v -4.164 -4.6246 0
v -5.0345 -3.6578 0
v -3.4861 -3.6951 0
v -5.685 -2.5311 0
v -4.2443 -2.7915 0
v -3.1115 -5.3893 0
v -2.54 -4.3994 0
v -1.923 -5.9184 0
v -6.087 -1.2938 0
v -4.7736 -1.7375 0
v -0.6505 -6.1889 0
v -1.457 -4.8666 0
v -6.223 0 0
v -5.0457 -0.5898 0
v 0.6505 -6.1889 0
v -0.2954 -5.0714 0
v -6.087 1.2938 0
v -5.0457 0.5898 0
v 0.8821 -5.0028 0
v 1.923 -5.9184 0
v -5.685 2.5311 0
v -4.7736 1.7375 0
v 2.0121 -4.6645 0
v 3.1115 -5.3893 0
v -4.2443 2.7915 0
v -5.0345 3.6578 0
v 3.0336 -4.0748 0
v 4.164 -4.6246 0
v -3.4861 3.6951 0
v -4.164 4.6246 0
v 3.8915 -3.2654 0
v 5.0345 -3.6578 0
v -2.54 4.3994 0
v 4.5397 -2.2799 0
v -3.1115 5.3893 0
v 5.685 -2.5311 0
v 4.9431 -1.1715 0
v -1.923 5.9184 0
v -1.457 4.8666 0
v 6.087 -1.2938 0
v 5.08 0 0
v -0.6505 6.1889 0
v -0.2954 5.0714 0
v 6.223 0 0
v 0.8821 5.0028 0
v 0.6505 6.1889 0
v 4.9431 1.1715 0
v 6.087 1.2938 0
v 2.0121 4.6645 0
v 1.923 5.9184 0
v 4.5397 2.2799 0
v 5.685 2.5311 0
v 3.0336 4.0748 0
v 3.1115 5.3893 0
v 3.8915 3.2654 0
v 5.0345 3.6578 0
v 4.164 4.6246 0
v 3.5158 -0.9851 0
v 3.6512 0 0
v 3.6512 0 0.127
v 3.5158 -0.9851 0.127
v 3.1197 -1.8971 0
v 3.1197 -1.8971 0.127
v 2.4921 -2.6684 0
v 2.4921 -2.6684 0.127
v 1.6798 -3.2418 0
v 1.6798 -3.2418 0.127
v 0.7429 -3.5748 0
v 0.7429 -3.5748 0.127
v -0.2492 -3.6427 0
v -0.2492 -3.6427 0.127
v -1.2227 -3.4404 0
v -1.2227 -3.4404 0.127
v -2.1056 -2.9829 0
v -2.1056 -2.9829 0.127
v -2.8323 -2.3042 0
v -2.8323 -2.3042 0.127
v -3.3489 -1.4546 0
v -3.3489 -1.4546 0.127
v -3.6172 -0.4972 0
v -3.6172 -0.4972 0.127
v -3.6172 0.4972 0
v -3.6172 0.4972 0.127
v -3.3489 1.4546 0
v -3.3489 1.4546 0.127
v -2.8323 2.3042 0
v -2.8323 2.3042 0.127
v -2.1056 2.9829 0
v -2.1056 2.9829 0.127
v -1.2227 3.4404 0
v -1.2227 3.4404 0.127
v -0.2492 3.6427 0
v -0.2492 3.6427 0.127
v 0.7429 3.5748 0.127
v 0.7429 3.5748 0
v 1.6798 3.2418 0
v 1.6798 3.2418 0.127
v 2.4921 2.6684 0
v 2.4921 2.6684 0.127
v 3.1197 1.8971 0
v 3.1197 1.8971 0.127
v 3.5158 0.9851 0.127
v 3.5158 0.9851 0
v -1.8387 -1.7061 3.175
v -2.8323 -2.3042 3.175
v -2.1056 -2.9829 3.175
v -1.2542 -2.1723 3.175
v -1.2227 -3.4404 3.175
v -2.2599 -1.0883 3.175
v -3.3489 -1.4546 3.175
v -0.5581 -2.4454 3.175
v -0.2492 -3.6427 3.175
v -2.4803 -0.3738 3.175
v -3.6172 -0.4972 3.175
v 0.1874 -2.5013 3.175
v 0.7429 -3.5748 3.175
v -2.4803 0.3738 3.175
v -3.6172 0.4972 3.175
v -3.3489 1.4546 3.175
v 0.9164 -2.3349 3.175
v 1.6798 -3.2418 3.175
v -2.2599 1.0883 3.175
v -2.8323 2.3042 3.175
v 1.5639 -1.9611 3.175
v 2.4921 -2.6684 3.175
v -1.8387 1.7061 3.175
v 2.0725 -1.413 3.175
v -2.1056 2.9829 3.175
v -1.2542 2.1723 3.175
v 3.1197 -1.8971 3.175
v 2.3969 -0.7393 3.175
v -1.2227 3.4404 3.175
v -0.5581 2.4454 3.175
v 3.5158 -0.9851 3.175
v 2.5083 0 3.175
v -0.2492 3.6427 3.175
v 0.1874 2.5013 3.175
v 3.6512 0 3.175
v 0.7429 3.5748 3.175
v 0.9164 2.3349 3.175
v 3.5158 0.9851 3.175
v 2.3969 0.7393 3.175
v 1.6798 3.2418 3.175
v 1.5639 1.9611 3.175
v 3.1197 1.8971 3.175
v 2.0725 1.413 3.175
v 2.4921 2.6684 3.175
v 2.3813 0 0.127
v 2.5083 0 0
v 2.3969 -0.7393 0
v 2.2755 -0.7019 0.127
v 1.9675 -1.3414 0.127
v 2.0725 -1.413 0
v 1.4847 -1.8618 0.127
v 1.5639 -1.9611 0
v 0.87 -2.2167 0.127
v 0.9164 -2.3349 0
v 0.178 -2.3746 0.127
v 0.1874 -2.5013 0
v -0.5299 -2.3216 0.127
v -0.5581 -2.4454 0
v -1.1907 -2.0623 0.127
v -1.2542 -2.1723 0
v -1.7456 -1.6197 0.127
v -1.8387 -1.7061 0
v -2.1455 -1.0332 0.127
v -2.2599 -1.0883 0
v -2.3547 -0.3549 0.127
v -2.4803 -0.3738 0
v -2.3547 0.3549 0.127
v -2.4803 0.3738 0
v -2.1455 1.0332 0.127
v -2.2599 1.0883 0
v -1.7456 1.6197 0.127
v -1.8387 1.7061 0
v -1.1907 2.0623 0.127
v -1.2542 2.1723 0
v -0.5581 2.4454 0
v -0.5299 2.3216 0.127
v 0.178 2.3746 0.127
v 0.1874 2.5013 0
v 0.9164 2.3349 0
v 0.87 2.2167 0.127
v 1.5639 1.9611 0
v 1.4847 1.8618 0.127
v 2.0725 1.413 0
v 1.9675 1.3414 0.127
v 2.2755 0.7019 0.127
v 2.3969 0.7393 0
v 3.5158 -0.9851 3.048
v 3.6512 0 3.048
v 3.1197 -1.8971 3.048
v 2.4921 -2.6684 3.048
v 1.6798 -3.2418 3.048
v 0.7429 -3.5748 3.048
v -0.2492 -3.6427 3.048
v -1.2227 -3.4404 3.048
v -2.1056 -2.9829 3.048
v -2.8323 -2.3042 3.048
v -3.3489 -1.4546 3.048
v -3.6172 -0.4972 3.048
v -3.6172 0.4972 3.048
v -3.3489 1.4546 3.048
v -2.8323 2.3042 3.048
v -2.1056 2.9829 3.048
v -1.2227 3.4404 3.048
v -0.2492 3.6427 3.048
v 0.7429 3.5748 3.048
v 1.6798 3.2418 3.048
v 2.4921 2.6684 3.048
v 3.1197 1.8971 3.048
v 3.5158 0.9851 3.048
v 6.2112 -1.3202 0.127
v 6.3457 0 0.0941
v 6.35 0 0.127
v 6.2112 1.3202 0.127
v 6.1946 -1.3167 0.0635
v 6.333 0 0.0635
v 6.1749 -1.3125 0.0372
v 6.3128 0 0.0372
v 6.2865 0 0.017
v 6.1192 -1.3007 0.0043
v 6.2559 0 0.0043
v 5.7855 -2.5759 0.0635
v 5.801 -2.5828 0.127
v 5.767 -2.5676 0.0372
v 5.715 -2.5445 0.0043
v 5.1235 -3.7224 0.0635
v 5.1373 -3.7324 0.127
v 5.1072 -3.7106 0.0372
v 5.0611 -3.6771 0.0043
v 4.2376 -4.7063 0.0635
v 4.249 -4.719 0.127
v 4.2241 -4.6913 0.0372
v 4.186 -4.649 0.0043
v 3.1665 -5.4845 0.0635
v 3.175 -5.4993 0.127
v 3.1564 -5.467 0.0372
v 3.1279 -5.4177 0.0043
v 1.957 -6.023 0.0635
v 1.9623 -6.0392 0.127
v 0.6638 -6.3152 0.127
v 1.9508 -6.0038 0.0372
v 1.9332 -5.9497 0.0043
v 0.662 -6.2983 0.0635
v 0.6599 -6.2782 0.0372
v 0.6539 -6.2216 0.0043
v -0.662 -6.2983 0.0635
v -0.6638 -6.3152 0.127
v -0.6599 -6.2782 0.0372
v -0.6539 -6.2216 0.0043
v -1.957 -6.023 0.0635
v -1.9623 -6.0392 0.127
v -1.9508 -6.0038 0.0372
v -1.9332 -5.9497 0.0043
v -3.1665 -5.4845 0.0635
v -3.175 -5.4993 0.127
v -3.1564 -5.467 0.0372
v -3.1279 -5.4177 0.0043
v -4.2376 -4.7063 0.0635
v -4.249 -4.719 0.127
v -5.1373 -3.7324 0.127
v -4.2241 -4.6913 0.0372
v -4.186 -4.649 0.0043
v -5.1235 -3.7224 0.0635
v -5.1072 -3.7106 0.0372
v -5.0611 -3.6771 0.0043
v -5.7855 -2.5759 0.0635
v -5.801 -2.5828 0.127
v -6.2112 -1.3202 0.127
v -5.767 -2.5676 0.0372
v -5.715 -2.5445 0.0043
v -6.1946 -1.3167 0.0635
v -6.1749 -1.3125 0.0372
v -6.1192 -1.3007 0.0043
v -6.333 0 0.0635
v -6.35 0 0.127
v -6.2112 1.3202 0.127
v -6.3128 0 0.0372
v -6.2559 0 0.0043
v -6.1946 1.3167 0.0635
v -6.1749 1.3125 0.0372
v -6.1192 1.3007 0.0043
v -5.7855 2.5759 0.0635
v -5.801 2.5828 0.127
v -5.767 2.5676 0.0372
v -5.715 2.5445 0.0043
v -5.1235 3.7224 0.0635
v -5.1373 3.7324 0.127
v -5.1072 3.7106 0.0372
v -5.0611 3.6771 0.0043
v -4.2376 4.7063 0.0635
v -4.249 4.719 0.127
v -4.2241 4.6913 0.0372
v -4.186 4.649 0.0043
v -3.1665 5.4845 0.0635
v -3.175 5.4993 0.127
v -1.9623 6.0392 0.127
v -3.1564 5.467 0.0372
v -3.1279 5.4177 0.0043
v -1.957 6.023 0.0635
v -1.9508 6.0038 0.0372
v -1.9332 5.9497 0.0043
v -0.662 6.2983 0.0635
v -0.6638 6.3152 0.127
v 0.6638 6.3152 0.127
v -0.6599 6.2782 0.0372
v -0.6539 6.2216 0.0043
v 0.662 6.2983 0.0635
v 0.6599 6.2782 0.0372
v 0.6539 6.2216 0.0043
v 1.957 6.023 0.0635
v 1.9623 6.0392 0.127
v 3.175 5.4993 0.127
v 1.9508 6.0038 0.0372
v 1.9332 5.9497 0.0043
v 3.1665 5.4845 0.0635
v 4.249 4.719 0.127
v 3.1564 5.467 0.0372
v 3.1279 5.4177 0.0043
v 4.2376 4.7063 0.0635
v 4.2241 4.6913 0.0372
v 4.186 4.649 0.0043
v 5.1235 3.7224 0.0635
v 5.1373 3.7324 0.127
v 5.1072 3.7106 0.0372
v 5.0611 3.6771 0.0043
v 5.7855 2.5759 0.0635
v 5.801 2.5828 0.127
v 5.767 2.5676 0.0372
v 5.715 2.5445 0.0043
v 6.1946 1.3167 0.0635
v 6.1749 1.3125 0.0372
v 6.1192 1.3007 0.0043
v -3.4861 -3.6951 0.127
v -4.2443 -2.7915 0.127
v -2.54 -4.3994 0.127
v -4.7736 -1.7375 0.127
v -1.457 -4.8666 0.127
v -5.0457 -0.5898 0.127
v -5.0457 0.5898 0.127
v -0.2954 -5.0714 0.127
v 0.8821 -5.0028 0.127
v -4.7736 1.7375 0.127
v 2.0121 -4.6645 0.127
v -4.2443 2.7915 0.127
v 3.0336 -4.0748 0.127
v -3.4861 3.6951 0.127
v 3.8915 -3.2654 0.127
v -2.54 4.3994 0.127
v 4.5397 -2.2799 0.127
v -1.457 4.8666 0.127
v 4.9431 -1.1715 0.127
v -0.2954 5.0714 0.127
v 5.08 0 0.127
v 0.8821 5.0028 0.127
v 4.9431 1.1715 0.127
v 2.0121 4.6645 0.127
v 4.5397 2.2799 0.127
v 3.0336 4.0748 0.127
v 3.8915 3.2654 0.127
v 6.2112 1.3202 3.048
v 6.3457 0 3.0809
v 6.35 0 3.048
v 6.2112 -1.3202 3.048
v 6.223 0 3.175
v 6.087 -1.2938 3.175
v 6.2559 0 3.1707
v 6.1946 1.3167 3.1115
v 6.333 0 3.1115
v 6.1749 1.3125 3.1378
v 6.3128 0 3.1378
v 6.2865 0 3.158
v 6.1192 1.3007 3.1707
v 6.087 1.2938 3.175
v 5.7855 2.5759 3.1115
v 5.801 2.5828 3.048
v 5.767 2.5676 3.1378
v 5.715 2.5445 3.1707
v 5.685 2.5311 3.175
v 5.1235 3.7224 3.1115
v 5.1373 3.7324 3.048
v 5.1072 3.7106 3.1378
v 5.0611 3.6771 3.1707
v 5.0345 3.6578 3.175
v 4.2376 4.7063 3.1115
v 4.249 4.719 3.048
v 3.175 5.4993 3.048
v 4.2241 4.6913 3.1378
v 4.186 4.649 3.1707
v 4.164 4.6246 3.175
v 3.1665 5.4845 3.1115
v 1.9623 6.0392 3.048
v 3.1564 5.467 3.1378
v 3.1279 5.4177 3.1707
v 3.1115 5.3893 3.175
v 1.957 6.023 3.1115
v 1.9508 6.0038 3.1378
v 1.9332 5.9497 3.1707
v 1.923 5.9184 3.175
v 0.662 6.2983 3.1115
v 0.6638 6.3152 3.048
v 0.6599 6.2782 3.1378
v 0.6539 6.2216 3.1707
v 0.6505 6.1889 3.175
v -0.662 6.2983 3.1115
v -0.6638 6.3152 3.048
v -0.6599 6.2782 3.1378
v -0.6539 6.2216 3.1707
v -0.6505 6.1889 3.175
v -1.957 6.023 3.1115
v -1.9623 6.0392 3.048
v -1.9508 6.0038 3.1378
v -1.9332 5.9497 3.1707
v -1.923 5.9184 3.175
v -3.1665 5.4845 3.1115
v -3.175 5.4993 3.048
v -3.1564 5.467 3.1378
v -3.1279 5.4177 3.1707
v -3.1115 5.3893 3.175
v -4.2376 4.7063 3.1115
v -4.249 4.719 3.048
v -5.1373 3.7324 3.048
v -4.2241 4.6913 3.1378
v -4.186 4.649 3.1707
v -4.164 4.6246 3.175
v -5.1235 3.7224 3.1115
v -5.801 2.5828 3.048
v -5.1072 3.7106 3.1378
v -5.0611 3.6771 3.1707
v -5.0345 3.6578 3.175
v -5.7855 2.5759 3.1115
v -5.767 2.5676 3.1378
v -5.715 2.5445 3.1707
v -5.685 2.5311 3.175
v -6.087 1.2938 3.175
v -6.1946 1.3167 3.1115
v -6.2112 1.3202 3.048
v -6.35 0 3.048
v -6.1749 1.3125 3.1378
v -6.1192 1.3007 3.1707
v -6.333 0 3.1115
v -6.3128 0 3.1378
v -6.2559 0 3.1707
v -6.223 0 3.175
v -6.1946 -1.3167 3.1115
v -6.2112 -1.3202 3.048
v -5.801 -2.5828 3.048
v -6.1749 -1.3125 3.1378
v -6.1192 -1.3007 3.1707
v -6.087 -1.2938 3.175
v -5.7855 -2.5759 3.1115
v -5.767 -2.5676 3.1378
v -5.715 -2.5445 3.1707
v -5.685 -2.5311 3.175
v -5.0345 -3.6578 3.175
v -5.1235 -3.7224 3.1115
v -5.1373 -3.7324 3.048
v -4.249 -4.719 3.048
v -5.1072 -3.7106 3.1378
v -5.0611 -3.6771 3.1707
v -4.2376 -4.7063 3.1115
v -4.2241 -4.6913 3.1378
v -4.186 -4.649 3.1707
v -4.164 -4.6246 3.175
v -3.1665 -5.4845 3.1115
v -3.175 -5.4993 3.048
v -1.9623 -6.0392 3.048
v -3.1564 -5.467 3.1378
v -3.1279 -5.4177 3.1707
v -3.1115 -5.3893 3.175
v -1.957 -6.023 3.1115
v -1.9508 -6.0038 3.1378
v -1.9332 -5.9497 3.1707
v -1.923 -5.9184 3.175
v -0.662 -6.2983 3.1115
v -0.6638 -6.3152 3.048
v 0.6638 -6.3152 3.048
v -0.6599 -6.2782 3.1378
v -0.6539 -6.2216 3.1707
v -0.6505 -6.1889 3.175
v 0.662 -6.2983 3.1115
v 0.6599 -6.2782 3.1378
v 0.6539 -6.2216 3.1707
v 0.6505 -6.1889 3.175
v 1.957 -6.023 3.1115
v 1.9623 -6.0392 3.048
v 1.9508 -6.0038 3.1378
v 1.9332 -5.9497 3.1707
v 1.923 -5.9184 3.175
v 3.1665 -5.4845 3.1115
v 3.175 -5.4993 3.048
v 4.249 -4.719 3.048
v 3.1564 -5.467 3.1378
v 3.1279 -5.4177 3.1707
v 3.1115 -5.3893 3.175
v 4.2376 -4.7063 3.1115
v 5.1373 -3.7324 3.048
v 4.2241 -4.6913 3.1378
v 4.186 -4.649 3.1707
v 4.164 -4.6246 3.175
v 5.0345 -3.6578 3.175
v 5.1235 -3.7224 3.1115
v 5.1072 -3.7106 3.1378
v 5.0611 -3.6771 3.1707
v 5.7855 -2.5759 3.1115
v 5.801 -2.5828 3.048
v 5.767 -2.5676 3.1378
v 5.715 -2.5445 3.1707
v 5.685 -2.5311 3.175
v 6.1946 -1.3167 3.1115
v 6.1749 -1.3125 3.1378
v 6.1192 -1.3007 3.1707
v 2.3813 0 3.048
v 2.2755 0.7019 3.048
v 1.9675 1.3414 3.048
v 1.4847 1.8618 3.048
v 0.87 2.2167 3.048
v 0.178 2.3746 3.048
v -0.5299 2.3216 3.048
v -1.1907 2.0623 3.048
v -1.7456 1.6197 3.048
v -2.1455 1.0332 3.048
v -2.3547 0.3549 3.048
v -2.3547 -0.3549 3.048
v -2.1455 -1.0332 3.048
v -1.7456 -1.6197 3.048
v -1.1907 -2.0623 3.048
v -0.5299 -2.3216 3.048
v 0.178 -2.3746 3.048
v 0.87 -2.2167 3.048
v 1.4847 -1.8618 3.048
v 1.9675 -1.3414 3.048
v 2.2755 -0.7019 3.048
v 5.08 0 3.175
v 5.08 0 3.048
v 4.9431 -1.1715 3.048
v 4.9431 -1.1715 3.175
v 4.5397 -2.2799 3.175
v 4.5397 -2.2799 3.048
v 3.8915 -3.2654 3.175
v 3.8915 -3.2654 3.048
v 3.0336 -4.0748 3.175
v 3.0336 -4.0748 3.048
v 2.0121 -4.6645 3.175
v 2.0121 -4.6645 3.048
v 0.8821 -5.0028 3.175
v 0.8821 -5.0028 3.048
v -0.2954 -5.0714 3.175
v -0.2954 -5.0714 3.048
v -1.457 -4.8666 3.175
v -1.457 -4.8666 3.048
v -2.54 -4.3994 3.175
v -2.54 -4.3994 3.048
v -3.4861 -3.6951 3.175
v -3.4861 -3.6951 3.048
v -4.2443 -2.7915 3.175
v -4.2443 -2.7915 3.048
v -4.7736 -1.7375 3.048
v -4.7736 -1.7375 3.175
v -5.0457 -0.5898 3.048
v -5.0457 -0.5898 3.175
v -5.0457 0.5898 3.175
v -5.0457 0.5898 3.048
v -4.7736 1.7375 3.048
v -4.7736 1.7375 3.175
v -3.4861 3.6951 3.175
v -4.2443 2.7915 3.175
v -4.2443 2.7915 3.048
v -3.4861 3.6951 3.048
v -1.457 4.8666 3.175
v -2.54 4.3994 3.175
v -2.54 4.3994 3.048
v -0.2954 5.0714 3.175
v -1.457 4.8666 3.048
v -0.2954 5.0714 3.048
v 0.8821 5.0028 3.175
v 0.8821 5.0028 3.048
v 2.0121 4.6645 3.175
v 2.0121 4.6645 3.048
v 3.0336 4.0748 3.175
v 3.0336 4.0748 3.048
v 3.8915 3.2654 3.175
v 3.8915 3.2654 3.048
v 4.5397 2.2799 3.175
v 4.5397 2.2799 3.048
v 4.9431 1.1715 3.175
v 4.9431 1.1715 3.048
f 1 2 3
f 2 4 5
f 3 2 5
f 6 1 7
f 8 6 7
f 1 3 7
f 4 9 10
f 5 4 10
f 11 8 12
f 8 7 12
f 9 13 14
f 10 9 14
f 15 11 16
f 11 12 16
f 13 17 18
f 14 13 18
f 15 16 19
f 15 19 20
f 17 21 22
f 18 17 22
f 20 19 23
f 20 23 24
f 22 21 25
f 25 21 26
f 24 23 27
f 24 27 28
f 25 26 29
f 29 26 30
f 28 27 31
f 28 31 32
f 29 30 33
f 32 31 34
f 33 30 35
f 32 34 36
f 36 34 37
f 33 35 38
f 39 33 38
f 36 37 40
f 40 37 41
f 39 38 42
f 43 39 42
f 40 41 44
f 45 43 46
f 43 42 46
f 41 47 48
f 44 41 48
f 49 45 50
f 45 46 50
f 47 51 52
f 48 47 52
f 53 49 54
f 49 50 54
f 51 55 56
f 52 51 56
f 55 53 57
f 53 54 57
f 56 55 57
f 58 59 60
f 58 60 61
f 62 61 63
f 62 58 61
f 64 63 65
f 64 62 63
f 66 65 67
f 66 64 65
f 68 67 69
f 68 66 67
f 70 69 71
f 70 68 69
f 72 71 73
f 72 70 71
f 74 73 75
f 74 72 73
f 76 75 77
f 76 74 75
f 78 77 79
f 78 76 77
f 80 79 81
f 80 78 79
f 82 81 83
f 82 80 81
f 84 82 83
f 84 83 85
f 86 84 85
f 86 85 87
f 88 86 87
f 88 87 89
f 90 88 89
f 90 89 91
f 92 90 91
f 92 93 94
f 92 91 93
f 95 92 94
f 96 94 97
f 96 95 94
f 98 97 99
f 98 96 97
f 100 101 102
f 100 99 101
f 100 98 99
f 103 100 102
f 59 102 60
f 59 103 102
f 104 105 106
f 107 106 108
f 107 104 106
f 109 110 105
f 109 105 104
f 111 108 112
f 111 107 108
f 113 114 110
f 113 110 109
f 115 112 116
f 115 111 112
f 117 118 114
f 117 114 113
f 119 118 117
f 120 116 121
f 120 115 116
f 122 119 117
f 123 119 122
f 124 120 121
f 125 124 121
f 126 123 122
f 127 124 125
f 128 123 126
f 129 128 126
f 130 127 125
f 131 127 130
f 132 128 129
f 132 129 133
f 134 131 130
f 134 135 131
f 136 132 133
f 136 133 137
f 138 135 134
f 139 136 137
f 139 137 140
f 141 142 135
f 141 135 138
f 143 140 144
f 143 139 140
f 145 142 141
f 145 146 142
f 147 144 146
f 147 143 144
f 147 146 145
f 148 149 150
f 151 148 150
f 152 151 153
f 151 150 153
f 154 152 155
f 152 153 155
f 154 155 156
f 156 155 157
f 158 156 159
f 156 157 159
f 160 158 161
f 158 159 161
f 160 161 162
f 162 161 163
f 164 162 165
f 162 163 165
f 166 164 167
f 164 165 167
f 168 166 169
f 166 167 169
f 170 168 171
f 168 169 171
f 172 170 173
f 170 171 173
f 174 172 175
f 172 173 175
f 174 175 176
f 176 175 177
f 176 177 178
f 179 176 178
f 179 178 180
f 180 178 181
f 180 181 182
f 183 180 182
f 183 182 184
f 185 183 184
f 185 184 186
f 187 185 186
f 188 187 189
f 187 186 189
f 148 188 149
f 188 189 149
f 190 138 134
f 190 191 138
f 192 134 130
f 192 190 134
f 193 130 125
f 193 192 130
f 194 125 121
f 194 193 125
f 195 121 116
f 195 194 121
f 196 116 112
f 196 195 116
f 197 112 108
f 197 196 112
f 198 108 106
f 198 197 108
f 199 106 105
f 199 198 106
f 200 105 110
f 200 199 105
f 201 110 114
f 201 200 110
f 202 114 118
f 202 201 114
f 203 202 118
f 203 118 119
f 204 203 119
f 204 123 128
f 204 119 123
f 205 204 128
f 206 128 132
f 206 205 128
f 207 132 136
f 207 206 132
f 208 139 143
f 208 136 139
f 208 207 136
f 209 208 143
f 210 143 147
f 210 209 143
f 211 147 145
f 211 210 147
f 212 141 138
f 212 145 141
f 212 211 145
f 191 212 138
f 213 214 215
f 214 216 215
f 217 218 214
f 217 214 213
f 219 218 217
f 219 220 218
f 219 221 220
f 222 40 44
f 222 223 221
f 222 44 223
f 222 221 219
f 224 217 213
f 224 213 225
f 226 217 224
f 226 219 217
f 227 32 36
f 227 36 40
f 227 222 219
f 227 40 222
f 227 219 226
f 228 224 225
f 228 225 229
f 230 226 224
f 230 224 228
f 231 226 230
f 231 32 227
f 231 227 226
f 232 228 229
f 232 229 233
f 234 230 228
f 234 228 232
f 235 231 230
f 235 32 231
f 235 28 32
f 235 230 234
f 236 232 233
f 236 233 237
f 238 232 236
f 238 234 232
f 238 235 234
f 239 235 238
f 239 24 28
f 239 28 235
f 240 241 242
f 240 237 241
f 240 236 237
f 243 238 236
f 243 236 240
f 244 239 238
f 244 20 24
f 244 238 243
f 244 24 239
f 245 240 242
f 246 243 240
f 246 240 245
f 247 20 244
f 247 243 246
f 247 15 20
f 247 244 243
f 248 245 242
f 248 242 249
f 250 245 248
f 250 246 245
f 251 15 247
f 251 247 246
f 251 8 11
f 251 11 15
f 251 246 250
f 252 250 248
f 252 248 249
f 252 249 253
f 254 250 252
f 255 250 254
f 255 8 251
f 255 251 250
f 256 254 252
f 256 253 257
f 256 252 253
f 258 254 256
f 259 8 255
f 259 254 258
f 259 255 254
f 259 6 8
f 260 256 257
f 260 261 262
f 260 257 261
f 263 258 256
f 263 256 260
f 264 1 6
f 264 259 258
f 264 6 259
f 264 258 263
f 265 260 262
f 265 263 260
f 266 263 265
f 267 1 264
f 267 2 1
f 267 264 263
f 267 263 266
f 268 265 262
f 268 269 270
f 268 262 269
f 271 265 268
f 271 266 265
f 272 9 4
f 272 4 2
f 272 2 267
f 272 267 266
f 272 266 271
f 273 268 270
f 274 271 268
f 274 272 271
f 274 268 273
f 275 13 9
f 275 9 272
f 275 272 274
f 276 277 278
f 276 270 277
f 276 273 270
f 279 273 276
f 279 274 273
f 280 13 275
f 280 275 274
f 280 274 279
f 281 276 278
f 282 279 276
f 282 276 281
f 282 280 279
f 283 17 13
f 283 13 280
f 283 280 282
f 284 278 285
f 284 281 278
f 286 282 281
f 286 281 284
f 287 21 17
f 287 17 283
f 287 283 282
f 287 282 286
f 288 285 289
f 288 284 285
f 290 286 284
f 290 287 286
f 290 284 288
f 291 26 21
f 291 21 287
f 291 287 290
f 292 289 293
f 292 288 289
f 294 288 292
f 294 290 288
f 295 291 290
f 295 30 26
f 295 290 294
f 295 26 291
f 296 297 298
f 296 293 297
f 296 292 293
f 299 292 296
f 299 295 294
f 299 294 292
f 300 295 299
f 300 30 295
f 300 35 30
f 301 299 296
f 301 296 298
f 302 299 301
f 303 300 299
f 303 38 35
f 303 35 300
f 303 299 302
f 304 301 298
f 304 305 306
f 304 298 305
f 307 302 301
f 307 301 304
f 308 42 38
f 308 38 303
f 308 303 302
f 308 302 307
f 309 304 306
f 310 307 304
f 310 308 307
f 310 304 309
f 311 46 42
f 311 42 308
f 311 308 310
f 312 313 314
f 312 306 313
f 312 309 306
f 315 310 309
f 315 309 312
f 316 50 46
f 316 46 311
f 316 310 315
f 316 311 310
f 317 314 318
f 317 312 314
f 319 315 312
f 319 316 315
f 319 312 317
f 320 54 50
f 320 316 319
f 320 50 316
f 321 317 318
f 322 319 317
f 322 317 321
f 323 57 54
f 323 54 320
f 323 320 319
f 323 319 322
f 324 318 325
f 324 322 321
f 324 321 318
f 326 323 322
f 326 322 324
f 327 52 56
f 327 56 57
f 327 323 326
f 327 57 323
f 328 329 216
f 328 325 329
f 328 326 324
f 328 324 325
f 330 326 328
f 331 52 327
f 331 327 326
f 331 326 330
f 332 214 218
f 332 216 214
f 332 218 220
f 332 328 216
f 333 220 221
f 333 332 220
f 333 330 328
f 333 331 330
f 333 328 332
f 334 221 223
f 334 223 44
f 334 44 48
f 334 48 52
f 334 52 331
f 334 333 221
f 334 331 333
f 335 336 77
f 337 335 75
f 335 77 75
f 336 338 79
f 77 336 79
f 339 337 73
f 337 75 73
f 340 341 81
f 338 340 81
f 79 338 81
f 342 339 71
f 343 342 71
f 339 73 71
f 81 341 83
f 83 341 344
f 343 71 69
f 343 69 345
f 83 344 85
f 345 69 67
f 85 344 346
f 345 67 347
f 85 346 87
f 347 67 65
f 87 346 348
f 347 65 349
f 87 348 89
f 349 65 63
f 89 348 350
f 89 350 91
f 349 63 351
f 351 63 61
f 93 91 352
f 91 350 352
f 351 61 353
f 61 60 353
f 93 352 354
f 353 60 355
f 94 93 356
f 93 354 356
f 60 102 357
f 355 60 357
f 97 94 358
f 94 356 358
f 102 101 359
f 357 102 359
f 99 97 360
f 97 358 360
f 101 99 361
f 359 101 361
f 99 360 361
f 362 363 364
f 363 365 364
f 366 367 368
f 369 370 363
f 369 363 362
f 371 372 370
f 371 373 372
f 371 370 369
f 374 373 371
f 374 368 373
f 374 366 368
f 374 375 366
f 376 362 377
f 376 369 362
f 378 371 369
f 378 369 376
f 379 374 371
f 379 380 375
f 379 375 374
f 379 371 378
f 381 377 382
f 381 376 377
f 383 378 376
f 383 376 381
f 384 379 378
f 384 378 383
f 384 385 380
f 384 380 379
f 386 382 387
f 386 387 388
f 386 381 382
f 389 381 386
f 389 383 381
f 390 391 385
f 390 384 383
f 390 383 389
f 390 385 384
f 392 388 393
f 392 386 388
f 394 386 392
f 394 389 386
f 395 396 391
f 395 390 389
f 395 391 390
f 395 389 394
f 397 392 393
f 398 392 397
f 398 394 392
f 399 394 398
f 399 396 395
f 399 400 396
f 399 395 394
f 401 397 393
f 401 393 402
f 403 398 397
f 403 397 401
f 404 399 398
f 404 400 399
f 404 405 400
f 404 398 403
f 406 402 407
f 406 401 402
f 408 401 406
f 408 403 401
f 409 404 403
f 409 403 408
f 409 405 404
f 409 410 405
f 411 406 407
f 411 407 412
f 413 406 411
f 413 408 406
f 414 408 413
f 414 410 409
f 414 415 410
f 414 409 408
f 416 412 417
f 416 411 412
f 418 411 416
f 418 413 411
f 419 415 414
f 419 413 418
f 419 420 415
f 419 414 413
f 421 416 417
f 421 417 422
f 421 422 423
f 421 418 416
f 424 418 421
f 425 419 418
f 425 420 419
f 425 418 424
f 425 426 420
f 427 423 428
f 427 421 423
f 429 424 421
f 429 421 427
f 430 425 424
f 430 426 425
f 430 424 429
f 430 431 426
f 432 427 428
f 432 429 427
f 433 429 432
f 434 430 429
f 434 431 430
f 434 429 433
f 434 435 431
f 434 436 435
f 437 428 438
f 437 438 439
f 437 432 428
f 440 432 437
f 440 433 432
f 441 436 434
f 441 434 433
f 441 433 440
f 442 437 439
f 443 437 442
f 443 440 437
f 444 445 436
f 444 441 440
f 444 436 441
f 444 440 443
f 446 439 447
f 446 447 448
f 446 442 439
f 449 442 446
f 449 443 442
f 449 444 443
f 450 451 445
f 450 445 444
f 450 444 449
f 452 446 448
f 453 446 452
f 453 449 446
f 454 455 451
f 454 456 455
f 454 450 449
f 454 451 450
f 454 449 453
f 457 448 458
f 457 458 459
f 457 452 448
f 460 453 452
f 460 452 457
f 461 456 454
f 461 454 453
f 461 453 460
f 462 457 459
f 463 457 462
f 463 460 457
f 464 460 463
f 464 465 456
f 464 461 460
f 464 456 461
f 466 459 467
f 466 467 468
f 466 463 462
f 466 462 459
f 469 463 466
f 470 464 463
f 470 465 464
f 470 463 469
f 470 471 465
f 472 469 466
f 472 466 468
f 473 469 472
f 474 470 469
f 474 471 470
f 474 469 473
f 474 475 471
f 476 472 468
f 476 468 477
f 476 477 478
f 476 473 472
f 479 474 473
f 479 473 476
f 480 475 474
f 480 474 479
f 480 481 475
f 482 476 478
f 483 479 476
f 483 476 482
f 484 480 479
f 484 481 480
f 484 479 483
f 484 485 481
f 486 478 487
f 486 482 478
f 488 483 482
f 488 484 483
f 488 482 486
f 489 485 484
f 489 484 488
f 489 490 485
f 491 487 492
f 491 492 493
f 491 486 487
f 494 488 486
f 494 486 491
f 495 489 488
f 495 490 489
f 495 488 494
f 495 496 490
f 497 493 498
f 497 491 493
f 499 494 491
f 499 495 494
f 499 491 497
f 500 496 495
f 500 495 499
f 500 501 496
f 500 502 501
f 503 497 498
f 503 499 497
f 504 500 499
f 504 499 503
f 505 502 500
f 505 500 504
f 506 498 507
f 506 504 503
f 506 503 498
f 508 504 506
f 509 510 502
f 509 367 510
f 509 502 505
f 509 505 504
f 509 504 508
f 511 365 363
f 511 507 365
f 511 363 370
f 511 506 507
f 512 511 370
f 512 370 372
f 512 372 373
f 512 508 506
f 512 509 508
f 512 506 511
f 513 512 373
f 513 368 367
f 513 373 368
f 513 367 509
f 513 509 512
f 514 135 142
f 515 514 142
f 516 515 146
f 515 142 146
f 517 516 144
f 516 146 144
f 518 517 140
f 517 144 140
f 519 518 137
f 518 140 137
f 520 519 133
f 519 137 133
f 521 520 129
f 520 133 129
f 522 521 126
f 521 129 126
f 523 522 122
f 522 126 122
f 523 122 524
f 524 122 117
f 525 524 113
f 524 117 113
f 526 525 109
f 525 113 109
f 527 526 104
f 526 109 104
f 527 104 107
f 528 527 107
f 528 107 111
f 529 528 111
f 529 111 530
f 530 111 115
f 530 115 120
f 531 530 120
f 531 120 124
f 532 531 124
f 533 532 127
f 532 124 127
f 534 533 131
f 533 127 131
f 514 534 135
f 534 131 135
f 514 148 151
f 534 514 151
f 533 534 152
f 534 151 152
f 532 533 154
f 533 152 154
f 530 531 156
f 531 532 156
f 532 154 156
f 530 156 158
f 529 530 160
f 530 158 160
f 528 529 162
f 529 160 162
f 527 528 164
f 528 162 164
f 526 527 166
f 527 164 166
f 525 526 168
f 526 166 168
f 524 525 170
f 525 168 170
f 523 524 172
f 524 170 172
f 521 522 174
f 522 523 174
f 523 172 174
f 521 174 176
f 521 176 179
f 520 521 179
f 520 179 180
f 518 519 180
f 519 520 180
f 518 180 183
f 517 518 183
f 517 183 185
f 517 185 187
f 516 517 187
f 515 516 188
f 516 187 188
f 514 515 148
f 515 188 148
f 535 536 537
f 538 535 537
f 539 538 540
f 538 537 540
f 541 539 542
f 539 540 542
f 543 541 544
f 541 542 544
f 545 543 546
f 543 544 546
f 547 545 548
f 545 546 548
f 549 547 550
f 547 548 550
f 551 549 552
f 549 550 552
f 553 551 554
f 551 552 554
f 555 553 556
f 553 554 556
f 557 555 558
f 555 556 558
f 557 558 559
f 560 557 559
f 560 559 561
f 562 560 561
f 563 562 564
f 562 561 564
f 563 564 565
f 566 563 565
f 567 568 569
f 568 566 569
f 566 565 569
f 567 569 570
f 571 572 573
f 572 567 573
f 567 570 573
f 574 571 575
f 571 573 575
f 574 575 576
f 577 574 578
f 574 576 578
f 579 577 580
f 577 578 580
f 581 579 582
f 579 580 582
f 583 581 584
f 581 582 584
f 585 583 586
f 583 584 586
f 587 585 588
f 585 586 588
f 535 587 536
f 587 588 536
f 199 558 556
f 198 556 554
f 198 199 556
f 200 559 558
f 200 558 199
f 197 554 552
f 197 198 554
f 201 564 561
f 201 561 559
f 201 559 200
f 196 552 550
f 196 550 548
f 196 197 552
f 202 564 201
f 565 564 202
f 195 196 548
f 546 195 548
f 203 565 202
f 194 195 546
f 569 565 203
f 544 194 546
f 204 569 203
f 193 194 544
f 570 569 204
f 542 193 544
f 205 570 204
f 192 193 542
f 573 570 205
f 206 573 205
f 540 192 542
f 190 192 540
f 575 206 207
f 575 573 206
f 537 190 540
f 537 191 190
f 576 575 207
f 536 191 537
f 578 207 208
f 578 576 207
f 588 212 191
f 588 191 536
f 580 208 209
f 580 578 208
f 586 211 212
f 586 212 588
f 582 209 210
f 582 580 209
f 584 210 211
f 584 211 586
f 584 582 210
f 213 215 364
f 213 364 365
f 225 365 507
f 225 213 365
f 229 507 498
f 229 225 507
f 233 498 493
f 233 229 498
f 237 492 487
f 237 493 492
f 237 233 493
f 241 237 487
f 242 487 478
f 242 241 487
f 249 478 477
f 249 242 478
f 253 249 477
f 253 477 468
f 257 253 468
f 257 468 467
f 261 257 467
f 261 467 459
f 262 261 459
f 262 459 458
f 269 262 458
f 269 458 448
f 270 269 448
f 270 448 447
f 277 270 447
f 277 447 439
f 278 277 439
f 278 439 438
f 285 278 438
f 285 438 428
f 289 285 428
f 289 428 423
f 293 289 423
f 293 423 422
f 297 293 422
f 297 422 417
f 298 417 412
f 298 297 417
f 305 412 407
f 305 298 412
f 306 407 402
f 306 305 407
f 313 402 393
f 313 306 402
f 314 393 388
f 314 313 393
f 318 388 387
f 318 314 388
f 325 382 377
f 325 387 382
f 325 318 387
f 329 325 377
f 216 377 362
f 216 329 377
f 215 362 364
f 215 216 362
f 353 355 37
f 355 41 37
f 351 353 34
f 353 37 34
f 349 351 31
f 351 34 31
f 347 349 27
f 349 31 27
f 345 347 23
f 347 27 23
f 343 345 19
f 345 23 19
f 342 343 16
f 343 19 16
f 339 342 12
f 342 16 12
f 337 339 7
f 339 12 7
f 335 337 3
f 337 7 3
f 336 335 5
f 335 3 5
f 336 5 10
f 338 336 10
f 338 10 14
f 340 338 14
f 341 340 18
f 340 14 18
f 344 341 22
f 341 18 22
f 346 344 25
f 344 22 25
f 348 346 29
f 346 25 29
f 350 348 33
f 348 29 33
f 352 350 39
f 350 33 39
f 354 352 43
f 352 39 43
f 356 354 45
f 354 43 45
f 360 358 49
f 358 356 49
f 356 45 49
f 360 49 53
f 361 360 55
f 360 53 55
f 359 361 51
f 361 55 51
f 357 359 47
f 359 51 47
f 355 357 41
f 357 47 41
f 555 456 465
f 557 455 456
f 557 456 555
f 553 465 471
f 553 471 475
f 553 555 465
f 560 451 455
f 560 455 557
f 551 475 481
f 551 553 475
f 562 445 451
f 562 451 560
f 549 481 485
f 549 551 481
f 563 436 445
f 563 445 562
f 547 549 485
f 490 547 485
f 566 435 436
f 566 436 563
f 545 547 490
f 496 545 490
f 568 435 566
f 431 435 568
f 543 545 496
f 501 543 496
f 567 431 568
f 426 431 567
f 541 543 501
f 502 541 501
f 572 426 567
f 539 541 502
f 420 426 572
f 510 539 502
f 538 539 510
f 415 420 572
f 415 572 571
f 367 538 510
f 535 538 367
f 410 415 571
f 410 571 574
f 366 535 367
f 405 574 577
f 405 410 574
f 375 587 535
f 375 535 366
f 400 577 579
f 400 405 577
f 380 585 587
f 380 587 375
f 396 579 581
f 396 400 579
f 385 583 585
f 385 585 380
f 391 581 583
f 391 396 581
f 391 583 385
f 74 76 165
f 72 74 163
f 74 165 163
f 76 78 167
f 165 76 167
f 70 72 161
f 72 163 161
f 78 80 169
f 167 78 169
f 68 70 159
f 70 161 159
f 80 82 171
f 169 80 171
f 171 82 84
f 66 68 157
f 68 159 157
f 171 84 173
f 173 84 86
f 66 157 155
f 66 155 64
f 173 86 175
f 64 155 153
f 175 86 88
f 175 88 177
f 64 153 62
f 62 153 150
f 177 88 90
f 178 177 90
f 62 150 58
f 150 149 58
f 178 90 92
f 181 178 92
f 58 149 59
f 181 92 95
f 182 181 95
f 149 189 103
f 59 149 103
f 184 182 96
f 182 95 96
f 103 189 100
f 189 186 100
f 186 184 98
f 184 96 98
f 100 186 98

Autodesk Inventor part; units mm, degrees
ref_plane "YZ Plane" through (0, 0, 0) normal (1, 0, 0) x (0, 1, 0)
ref_plane "XZ Plane" through (0, 0, 0) normal (0, 1, 0) x (-1, 0, 0)
sketch "Sketch1" plane through (0, 0, 0) normal (0, 0, 1) x (1, 0, 0)
  circle A0 centre (0, 0) radius 2.3813
  circle A1 centre (0, 0) radius 6.35
  circle A2 centre (0, 0) radius 3.6512
  circle A3 centre (0, 0) radius 5.08
  dimension "d0" = 4.7625
  dimension "d1" = 12.7
  dimension "d2" = 1.27
  dimension "d3" = 1.27
extrude "Extrusion1" add sketch "Sketch1" along normal blind 3.175
fillet "Fillet1" radius 0.127 2 edges at (-6.35, 0, 3.175) (-6.35, 0, 0)
chamfer "Chamfer1" distance 0.127 angle 45 2 edges at (-2.3813, 0, 3.175) (-2.3813, 0, 0)
ref_plane "Work Plane1" through (0, 0, 1.5875) normal (0, 0, 1) x (1, 0, 0)
sketch "Sketch2" plane through (0, 0, 1.5875) normal (0, 0, 1) x (1, 0, 0)
  circle A0 centre (0, 0) radius 2.3813 projected
  circle A1 centre (0, 0) radius 3.6512 projected
  circle A2 centre (0, 0) radius 6.35 projected
  circle A3 centre (0, 0) radius 5.08 projected
extrude "Extrusion2" add sketch "Sketch2" along normal mid plane 2.921 contours A3
properties part number "Rear Hub Bearing"
